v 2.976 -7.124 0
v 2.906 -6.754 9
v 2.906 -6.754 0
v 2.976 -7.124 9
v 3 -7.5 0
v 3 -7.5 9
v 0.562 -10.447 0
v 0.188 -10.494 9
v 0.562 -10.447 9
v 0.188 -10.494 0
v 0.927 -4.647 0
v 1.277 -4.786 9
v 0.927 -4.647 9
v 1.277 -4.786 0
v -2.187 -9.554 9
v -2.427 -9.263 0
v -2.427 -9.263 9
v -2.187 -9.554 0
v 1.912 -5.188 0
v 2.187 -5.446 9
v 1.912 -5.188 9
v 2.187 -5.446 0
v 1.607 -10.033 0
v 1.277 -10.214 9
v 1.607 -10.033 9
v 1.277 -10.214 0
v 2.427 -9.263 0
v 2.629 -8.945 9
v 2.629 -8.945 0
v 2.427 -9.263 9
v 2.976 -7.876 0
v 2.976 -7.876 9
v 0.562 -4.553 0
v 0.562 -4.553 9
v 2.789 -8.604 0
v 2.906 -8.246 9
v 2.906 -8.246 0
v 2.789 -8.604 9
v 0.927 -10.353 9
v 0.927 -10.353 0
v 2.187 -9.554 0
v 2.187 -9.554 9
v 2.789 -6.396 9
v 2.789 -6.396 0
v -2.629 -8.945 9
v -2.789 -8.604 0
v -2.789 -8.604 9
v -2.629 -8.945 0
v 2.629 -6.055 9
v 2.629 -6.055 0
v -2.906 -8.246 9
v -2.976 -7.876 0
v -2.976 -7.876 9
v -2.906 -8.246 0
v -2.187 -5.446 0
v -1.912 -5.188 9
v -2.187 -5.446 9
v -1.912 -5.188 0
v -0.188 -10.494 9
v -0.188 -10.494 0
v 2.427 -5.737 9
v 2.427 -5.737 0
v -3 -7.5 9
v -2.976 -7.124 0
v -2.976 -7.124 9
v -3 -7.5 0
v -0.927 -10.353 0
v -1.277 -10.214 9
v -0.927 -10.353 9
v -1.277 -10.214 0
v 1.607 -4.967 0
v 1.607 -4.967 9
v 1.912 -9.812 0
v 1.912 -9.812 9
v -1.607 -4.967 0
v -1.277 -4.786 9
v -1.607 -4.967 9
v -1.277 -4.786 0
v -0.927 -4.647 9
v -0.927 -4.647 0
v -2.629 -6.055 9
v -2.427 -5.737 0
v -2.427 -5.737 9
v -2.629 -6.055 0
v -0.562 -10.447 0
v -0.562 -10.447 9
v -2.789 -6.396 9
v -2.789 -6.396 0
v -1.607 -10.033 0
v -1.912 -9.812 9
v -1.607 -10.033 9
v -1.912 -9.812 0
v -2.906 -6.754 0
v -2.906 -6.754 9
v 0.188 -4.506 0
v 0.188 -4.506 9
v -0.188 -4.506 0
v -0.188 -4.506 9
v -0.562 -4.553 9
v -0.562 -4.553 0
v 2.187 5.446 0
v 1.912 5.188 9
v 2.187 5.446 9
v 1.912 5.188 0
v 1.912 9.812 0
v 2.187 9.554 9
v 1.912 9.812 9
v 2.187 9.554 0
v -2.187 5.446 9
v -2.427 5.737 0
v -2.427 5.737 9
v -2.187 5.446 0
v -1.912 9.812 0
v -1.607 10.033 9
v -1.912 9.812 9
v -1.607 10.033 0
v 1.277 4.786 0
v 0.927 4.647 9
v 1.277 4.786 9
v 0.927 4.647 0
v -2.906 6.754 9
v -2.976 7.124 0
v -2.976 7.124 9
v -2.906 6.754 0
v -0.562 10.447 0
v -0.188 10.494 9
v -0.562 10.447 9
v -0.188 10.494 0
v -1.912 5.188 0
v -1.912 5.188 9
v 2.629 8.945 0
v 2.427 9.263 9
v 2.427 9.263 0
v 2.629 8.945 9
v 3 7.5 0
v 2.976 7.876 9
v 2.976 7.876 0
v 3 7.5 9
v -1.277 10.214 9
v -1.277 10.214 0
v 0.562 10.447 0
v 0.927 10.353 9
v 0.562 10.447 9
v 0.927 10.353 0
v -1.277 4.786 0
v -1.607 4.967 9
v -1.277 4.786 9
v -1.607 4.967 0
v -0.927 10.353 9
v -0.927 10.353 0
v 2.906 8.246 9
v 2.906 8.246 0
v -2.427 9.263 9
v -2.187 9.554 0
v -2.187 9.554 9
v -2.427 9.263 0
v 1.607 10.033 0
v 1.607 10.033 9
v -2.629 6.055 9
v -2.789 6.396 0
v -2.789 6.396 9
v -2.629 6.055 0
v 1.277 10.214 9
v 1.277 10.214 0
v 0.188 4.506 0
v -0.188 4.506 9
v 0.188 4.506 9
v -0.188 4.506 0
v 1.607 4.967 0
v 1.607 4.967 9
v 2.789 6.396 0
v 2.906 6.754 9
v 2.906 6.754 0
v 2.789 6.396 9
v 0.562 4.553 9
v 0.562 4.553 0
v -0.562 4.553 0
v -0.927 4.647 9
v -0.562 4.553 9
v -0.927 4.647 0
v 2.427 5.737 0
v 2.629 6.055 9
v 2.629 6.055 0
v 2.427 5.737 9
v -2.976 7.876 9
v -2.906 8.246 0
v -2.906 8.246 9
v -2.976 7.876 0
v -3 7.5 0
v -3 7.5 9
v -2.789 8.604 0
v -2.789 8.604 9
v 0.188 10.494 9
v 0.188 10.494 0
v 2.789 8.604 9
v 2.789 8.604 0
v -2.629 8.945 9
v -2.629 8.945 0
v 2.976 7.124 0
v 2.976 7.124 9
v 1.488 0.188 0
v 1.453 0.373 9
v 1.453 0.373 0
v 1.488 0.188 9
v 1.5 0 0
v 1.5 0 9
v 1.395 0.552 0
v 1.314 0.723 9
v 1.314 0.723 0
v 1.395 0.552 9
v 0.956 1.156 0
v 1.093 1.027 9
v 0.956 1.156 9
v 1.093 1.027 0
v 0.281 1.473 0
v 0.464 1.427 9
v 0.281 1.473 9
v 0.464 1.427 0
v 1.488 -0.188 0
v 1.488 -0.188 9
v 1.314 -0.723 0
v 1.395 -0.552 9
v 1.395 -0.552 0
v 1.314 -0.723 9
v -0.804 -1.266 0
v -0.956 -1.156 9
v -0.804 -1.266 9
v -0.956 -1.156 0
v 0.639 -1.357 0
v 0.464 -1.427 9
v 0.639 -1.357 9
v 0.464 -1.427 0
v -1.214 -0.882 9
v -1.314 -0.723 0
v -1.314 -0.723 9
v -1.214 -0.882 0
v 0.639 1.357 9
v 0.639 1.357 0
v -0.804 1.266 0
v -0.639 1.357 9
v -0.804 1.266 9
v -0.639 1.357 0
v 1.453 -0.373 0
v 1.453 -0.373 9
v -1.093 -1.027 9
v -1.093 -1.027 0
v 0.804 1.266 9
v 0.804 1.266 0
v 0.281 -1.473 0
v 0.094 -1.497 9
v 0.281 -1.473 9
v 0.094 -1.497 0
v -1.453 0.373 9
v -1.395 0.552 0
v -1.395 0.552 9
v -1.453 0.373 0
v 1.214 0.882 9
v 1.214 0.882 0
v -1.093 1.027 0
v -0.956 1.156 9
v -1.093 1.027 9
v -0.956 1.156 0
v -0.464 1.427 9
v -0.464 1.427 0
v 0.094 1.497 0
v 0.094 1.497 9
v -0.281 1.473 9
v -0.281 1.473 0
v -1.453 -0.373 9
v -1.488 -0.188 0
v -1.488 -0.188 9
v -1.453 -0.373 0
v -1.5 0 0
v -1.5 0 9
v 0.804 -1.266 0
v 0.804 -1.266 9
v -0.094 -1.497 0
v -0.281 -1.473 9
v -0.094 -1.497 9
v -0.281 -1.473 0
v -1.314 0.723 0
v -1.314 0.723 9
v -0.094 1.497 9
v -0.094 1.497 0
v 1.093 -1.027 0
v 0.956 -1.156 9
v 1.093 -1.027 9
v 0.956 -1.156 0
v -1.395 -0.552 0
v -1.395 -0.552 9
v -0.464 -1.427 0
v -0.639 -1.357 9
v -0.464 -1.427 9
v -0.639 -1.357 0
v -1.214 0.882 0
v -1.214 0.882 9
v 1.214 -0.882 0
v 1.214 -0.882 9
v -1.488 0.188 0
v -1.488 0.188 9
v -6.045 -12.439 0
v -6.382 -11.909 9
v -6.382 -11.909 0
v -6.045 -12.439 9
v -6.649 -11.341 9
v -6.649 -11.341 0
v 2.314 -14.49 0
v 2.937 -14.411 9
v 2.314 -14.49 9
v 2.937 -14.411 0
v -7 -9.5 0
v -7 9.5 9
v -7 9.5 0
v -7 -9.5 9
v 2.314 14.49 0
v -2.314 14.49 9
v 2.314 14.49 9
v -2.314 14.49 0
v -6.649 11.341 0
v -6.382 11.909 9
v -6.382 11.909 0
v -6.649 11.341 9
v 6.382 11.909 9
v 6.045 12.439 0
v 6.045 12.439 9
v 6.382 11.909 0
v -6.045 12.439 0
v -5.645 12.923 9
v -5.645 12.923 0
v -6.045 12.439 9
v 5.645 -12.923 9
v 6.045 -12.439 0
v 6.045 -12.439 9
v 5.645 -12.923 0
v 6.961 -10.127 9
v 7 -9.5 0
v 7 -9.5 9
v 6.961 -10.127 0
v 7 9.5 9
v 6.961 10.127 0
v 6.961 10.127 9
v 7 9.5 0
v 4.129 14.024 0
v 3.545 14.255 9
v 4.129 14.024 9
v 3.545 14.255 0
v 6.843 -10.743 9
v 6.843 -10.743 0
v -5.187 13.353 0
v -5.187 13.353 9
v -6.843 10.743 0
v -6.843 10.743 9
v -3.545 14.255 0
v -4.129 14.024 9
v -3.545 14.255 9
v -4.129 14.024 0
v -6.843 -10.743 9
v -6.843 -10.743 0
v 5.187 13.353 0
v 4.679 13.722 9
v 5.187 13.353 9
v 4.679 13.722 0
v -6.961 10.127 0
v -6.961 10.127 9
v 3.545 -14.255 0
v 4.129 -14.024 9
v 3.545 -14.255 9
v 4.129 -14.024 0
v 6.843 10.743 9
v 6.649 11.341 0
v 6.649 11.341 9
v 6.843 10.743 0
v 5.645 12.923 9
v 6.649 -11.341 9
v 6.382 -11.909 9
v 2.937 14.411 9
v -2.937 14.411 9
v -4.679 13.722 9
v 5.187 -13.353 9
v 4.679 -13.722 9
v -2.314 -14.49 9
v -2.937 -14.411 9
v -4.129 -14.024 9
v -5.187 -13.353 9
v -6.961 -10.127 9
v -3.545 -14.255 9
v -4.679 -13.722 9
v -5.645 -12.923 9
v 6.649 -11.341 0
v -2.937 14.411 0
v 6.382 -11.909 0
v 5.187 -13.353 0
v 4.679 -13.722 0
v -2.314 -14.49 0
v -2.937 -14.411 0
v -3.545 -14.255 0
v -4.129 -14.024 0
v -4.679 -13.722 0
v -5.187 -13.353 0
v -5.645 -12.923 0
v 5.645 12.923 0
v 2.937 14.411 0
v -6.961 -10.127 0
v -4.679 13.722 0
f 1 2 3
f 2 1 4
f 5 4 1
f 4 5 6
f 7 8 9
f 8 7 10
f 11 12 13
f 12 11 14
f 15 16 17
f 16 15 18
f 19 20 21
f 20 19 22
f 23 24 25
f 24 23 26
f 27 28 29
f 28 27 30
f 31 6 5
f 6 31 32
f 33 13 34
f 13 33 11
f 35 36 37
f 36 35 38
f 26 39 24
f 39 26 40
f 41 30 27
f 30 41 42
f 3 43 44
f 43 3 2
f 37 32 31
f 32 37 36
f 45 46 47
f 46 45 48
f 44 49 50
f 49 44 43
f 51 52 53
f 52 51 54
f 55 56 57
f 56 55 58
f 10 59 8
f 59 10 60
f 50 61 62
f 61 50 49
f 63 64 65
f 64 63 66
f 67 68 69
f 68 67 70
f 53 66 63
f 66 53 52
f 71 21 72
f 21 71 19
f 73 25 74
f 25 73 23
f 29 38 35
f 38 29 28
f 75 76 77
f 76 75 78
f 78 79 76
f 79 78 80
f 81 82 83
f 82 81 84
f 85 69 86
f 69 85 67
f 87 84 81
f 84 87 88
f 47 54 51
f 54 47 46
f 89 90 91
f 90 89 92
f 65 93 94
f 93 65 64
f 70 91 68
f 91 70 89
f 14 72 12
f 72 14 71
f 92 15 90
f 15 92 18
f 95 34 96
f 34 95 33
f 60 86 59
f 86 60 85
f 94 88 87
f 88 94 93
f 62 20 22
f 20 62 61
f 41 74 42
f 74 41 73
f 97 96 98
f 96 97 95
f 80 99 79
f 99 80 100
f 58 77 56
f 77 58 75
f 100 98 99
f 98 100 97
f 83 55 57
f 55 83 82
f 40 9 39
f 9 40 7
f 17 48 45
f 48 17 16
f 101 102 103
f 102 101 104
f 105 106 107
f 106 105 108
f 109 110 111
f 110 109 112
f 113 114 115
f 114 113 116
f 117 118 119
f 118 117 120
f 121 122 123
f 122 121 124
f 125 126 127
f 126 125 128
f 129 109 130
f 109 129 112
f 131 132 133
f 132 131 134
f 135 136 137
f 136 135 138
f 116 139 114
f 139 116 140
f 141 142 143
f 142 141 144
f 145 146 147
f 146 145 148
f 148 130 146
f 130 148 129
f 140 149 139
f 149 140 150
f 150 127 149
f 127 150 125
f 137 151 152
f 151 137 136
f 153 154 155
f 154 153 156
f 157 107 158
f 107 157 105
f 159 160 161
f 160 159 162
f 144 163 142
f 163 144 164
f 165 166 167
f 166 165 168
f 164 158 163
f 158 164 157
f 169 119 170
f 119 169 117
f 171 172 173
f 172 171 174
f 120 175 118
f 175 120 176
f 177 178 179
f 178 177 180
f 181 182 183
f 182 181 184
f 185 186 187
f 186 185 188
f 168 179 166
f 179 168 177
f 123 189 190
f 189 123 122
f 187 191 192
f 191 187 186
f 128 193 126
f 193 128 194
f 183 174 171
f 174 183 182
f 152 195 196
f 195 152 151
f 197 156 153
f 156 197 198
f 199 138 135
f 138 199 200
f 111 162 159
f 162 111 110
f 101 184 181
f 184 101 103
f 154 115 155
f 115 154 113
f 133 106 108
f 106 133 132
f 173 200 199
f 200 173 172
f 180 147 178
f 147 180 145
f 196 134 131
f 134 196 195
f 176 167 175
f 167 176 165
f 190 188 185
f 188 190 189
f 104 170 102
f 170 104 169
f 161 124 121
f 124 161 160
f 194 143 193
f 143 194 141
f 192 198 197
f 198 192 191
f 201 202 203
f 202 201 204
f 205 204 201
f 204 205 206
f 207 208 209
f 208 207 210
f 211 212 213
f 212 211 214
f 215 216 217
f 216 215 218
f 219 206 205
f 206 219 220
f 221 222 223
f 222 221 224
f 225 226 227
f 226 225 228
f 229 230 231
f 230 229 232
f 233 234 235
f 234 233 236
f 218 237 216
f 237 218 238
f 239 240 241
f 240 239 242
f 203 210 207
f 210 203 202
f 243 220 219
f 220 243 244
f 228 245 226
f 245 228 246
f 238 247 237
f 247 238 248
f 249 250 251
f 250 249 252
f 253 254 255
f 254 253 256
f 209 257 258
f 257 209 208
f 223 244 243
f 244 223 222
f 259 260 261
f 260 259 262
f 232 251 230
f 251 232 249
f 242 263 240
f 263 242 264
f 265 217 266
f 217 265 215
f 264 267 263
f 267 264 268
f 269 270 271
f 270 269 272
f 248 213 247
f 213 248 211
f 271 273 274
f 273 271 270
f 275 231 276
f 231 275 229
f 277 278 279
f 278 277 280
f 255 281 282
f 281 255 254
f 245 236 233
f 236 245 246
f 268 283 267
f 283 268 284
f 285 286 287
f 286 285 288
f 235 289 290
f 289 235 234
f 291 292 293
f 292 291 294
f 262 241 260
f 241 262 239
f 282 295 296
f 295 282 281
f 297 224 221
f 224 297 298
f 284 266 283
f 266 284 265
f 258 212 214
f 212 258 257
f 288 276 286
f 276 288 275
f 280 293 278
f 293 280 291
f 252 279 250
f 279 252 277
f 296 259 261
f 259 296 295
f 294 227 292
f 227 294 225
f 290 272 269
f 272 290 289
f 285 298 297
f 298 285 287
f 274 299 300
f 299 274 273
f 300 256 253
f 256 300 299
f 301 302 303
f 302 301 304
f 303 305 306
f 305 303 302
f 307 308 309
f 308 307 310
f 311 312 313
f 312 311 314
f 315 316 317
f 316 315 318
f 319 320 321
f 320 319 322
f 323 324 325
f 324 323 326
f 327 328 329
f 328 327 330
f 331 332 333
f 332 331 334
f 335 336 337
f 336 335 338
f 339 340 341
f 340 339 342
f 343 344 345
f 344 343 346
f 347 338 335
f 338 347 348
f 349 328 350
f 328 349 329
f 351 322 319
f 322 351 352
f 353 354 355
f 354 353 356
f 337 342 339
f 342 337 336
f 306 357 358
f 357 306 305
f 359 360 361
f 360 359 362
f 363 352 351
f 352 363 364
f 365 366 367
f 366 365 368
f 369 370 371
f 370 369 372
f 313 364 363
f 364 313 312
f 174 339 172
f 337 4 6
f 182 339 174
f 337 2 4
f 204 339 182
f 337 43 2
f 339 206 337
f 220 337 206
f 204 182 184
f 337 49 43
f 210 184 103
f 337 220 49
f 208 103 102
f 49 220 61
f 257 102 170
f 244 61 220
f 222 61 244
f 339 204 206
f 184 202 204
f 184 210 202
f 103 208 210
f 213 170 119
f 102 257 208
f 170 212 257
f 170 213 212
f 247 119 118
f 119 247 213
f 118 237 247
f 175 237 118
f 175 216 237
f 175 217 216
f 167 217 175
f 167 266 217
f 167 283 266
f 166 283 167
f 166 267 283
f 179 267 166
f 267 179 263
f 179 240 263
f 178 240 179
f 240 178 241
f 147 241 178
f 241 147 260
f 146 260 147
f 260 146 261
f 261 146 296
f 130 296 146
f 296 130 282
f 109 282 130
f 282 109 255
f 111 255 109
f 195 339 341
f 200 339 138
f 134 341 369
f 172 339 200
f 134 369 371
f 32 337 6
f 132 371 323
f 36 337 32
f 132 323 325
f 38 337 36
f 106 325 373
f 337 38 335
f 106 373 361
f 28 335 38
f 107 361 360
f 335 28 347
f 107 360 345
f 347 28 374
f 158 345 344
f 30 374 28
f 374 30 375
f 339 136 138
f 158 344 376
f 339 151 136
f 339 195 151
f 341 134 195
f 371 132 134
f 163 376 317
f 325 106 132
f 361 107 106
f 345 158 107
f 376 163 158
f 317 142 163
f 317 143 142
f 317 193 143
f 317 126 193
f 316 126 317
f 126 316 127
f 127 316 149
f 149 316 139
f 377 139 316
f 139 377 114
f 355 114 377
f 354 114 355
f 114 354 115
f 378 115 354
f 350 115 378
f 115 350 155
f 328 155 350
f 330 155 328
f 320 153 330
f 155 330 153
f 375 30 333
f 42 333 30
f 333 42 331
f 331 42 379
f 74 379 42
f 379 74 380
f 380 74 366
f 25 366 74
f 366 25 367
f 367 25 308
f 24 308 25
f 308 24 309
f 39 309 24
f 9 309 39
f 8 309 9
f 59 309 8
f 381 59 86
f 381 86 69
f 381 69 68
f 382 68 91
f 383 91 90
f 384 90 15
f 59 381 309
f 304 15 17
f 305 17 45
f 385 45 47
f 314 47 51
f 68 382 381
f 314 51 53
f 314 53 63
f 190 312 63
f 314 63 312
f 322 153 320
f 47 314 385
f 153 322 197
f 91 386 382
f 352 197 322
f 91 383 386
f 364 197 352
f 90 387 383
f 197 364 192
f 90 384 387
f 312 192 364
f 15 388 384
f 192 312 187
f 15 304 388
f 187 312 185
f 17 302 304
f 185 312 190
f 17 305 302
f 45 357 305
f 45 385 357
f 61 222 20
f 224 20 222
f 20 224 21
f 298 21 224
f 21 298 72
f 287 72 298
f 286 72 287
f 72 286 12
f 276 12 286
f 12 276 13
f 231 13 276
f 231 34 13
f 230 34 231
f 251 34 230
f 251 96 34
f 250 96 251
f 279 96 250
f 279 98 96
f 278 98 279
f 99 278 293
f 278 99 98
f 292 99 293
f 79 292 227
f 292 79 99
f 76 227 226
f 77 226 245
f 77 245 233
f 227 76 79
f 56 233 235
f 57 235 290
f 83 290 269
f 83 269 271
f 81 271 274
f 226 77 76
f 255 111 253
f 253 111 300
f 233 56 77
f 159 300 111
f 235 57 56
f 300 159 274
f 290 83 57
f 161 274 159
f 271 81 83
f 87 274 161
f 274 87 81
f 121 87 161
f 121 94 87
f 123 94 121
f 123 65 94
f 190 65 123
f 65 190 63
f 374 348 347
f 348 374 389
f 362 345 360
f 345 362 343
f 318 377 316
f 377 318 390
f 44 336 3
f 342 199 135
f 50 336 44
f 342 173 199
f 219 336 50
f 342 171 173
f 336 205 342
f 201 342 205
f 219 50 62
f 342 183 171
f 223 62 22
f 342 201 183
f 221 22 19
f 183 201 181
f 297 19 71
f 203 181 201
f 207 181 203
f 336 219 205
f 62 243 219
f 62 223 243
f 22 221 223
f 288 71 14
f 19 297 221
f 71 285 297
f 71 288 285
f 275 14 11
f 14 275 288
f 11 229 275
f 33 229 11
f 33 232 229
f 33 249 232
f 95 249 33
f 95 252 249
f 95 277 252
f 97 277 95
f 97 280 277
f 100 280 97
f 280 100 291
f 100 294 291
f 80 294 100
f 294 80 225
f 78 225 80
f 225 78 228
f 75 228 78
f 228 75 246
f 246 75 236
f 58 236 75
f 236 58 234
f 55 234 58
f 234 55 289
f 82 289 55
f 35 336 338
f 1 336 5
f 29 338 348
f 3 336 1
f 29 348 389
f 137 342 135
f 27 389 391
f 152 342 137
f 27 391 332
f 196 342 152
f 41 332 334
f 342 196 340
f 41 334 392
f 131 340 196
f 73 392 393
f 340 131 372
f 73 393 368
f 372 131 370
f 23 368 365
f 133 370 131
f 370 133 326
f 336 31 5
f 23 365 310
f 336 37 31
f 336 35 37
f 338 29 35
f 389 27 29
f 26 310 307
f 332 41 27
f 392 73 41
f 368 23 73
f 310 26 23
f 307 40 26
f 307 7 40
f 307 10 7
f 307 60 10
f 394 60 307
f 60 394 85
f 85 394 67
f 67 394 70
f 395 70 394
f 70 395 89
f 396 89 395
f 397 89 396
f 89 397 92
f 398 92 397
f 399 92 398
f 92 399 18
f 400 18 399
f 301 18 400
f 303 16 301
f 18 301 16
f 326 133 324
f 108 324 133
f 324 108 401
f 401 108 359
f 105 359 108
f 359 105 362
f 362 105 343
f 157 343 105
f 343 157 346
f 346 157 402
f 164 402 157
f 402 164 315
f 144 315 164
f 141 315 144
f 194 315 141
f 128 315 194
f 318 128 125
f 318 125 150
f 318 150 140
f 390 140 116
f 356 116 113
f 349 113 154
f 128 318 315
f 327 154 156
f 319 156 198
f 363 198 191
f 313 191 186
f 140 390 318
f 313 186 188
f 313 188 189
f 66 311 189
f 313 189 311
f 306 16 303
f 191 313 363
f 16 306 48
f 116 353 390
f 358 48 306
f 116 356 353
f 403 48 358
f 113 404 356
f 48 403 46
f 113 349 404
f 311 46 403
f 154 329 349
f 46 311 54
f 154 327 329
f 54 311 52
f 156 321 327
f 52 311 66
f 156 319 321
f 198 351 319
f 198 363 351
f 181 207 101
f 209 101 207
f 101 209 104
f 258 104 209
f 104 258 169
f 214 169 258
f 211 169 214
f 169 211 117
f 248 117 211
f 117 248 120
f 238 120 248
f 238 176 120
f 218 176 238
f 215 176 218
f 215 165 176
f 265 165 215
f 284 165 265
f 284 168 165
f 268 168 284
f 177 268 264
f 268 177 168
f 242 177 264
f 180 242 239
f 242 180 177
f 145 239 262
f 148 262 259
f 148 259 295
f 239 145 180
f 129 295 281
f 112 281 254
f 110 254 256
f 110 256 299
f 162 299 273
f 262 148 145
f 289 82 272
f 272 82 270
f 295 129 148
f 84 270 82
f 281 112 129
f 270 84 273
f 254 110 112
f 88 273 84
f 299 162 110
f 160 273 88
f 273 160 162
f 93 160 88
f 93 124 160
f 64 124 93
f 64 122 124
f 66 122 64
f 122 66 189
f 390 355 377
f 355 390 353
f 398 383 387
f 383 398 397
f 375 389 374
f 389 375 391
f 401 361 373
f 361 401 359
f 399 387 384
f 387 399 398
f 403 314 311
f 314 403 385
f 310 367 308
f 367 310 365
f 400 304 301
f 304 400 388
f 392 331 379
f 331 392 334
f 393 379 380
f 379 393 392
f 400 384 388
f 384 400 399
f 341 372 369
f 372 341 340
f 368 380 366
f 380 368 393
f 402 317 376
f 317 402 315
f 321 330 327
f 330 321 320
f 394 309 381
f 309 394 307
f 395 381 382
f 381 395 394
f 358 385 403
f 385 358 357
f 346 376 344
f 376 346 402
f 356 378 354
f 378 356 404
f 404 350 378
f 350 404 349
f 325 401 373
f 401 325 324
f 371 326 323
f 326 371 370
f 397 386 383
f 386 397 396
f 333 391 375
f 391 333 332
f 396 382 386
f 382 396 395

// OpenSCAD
$fn = 50;

difference() {
	union() {
		hull() {
			translate(v = [-2.0, 9.5, 0]) {
				cylinder(h = 9, r = 5);
			}
			translate(v = [2.0, 9.5, 0]) {
				cylinder(h = 9, r = 5);
			}
			translate(v = [-2.0, -9.5, 0]) {
				cylinder(h = 9, r = 5);
			}
			translate(v = [2.0, -9.5, 0]) {
				cylinder(h = 9, r = 5);
			}
		}
	}
	union() {
		translate(v = [0.0, -7.5, 0]) {
			translate(v = [0, 0, -100]) {
				cylinder(h = 200, r = 3.0);
			}
		}
		translate(v = [0.0, 7.5, 0]) {
			translate(v = [0, 0, -100]) {
				cylinder(h = 200, r = 3.0);
			}
		}
		translate(v = [0.0, -7.5, 0]) {
			translate(v = [0, 0, -100]) {
				cylinder(h = 200, r = 1.5);
			}
		}
		translate(v = [0, 0, -100]) {
			cylinder(h = 200, r = 1.5);
		}
		translate(v = [0.0, 7.5, 0]) {
			translate(v = [0, 0, -100]) {
				cylinder(h = 200, r = 1.5);
			}
		}
	}
}
